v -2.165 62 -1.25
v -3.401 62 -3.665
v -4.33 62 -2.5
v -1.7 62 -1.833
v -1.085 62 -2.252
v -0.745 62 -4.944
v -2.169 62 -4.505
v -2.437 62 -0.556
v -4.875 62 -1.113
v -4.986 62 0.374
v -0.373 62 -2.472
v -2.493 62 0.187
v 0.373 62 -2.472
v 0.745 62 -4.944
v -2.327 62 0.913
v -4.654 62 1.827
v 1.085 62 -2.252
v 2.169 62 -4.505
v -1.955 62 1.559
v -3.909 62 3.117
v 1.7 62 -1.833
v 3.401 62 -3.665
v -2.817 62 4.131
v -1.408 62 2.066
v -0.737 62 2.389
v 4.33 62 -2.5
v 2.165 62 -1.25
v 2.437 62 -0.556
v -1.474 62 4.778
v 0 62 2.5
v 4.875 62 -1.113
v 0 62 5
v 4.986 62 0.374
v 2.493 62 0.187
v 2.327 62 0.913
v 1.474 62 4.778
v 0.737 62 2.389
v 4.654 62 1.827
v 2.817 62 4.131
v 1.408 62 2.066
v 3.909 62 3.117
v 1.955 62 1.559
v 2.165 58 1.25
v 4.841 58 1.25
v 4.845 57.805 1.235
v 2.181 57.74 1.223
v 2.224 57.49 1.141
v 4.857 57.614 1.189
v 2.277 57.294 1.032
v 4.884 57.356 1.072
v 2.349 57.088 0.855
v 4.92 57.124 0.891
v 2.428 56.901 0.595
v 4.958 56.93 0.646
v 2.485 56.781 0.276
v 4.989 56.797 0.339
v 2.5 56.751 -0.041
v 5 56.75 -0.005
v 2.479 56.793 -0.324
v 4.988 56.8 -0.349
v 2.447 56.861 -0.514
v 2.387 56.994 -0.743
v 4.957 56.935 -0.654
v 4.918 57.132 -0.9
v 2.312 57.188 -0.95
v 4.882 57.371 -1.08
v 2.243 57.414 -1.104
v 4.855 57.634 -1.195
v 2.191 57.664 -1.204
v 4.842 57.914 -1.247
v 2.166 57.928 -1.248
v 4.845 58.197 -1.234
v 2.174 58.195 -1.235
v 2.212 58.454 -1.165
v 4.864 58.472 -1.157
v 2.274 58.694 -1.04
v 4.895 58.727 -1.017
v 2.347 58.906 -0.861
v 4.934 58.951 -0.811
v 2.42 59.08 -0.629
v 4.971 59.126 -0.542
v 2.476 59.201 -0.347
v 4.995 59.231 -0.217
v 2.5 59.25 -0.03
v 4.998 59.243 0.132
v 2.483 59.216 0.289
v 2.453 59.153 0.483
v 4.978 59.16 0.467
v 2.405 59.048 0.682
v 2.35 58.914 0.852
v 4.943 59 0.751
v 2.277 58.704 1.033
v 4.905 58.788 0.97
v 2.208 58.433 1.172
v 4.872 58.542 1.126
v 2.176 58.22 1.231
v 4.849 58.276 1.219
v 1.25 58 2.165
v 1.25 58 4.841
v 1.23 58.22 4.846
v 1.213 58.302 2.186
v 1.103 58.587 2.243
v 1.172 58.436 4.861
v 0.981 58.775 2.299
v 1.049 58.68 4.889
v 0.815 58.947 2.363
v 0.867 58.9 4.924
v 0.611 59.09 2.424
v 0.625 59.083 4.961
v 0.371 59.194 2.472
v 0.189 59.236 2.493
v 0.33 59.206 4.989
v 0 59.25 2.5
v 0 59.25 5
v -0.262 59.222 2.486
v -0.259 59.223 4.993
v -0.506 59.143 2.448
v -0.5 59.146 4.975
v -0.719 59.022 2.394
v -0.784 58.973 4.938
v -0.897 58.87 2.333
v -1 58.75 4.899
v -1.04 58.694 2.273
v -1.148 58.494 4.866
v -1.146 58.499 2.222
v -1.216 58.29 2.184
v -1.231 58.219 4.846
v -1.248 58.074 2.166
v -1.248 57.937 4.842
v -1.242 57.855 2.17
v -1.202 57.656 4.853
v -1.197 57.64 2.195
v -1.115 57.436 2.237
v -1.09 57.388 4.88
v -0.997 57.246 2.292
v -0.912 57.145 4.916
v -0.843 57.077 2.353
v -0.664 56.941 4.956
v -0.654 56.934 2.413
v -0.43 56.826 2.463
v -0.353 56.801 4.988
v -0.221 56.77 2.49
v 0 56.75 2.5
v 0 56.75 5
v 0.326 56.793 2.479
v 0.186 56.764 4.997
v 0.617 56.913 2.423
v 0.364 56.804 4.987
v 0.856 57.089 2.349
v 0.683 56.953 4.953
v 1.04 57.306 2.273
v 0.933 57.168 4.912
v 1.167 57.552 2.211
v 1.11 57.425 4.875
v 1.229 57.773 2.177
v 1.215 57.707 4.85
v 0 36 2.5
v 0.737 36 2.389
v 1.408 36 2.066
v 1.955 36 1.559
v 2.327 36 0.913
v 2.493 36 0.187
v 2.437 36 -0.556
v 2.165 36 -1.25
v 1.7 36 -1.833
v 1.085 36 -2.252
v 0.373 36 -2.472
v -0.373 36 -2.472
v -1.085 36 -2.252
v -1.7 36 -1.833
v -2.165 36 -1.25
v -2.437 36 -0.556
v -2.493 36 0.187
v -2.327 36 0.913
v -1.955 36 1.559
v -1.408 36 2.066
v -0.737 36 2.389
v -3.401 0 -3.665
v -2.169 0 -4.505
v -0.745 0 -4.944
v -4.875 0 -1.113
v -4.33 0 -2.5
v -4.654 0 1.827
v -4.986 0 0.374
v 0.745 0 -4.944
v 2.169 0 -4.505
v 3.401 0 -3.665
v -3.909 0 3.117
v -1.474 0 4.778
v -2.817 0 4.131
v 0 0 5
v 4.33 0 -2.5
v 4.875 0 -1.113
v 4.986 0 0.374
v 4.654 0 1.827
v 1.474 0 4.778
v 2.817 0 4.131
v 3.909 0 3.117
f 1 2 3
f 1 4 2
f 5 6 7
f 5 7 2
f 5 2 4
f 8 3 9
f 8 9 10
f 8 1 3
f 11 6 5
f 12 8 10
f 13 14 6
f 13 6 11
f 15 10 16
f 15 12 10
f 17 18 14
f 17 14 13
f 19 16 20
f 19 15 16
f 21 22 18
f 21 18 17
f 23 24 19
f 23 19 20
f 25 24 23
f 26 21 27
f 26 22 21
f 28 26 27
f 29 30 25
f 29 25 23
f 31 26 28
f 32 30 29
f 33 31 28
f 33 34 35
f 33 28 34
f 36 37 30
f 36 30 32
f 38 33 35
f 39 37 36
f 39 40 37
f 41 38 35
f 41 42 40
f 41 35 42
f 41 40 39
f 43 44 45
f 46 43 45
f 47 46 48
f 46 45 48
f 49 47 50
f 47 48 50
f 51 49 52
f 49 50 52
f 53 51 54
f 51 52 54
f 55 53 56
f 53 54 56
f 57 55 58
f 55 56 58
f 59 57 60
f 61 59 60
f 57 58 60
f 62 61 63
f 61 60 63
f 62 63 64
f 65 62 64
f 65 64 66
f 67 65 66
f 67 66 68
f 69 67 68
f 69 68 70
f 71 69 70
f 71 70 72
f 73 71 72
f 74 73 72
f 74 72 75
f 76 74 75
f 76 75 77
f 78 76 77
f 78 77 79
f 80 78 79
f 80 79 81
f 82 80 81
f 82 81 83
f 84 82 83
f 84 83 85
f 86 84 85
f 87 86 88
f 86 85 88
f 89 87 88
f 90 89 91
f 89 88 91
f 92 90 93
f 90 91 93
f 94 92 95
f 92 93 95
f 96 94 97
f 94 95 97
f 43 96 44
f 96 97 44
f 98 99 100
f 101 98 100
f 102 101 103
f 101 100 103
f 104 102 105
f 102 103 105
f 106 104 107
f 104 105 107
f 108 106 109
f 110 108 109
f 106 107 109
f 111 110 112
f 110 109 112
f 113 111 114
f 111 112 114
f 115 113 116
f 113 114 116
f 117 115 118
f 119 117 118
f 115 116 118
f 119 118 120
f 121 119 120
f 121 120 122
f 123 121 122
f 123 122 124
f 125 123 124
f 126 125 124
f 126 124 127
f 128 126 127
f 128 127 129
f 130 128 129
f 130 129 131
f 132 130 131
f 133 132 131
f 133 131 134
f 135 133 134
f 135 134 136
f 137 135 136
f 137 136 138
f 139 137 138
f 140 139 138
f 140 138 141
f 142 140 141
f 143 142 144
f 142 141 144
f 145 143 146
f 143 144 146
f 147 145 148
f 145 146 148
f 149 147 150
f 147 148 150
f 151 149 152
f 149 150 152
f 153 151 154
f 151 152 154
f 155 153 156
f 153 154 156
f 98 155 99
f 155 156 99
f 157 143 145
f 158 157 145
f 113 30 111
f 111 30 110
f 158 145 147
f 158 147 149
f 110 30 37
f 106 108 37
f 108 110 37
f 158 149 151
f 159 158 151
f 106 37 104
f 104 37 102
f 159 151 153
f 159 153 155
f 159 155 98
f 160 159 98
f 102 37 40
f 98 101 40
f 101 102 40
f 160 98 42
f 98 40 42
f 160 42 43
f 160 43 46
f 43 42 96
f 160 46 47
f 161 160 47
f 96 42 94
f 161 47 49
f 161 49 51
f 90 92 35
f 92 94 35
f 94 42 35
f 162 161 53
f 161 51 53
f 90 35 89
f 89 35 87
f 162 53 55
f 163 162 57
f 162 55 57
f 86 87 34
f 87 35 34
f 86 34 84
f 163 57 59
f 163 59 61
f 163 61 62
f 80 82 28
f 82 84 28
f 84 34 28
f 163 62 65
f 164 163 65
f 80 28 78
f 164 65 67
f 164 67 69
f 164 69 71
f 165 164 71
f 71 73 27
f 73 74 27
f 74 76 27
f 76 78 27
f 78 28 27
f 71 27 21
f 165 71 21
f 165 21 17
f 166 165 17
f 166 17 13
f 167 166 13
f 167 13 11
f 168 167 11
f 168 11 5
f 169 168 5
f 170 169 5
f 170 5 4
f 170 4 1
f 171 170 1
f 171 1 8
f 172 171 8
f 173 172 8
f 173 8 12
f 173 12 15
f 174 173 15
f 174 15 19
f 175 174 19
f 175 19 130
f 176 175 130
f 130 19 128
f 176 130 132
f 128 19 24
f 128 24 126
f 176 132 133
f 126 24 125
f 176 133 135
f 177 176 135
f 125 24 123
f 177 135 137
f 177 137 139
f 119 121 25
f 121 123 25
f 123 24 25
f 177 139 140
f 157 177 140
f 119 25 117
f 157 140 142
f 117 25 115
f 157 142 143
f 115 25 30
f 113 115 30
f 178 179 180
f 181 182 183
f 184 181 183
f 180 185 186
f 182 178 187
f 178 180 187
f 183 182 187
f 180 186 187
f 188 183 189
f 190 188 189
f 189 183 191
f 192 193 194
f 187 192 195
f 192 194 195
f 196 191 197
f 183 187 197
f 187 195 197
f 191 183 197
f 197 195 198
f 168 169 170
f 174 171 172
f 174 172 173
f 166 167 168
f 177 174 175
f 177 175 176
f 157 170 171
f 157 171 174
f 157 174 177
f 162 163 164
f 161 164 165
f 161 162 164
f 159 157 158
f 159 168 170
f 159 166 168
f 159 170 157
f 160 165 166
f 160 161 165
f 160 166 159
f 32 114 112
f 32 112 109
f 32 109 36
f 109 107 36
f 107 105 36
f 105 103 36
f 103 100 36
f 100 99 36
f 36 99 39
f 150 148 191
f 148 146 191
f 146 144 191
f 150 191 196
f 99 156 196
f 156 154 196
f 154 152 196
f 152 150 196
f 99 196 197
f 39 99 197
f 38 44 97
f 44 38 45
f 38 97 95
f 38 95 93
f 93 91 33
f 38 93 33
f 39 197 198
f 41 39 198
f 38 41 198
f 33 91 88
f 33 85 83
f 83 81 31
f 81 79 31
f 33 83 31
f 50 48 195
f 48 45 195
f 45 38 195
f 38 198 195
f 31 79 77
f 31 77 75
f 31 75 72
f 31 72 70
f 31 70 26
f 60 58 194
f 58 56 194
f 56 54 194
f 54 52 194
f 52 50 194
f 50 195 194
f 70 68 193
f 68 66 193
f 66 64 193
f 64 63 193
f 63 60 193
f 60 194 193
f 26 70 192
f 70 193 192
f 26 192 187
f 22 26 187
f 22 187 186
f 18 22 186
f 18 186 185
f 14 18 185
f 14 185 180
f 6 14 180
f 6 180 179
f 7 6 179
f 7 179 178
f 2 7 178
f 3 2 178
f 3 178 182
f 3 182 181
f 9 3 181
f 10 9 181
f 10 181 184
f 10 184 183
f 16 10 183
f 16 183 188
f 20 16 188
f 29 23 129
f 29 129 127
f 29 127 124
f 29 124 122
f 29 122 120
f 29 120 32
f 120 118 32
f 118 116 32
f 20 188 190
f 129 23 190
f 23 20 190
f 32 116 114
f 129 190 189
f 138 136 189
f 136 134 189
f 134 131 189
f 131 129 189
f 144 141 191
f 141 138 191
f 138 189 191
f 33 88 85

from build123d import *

# Parameters (mm, degrees)
SKETCH1_R              = 5
BOSS_EXTRUDE1_DEPTH    = 62
SKETCH7_R              = 2.5
CUT_EXTRUDE1_DEPTH     = 26
M3_TAPPED_HOLE1_REACH  = 61.068
M3_TAPPED_HOLE1_BORE_R = 1.25
M3_TAPPED_HOLE2_REACH  = 61.068
M3_TAPPED_HOLE2_BORE_R = 1.25


with BuildPart() as part:
    # Sketch1 → Boss-Extrude1 (new body)
    with BuildSketch(Plane(origin=(0, 0, 0), x_dir=(1, 0, 0), z_dir=(0, 1, 0))):
        with Locations(Location((0, 0, 0), (0, 0, 270))):
            Circle(SKETCH1_R)
    extrude(amount=BOSS_EXTRUDE1_DEPTH)

    # Sketch7 → Cut-Extrude1 (cut)
    with BuildSketch(Plane(origin=(0, 62, 0), x_dir=(1, 0, 0), z_dir=(0, 1, 0))):
        with Locations(Location((0, 0, 0), (0, 0, 270))):
            Circle(SKETCH7_R)
    extrude(amount=-CUT_EXTRUDE1_DEPTH, mode=Mode.SUBTRACT)

    # M3 Tapped Hole1 bore (on position points) → M3 Tapped Hole1 (cut, up to next)
    with BuildSketch(Plane(origin=(0, 58, 5), x_dir=(1, 0, 0), z_dir=(0, 0, 1)), mode=Mode.PRIVATE) as m3_tapped_hole1_sk1:
        Circle(M3_TAPPED_HOLE1_BORE_R)
    m3_tapped_hole1_tool1 = extrude(m3_tapped_hole1_sk1.sketch, amount=-M3_TAPPED_HOLE1_REACH, mode=Mode.PRIVATE) & part.part
    add(m3_tapped_hole1_tool1.solids().sort_by_distance((0, 58, 5))[0], mode=Mode.SUBTRACT)

    # M3 Tapped Hole2 bore (on position points) → M3 Tapped Hole2 (cut, up to next)
    with BuildSketch(Plane(origin=(5, 58, 0), x_dir=(0, 0, 1), z_dir=(1, 0, 0)), mode=Mode.PRIVATE) as m3_tapped_hole2_sk1:
        Circle(M3_TAPPED_HOLE2_BORE_R)
    m3_tapped_hole2_tool1 = extrude(m3_tapped_hole2_sk1.sketch, amount=-M3_TAPPED_HOLE2_REACH, mode=Mode.PRIVATE) & part.part
    add(m3_tapped_hole2_tool1.solids().sort_by_distance((5, 58, 0))[0], mode=Mode.SUBTRACT)


solid = part.part
